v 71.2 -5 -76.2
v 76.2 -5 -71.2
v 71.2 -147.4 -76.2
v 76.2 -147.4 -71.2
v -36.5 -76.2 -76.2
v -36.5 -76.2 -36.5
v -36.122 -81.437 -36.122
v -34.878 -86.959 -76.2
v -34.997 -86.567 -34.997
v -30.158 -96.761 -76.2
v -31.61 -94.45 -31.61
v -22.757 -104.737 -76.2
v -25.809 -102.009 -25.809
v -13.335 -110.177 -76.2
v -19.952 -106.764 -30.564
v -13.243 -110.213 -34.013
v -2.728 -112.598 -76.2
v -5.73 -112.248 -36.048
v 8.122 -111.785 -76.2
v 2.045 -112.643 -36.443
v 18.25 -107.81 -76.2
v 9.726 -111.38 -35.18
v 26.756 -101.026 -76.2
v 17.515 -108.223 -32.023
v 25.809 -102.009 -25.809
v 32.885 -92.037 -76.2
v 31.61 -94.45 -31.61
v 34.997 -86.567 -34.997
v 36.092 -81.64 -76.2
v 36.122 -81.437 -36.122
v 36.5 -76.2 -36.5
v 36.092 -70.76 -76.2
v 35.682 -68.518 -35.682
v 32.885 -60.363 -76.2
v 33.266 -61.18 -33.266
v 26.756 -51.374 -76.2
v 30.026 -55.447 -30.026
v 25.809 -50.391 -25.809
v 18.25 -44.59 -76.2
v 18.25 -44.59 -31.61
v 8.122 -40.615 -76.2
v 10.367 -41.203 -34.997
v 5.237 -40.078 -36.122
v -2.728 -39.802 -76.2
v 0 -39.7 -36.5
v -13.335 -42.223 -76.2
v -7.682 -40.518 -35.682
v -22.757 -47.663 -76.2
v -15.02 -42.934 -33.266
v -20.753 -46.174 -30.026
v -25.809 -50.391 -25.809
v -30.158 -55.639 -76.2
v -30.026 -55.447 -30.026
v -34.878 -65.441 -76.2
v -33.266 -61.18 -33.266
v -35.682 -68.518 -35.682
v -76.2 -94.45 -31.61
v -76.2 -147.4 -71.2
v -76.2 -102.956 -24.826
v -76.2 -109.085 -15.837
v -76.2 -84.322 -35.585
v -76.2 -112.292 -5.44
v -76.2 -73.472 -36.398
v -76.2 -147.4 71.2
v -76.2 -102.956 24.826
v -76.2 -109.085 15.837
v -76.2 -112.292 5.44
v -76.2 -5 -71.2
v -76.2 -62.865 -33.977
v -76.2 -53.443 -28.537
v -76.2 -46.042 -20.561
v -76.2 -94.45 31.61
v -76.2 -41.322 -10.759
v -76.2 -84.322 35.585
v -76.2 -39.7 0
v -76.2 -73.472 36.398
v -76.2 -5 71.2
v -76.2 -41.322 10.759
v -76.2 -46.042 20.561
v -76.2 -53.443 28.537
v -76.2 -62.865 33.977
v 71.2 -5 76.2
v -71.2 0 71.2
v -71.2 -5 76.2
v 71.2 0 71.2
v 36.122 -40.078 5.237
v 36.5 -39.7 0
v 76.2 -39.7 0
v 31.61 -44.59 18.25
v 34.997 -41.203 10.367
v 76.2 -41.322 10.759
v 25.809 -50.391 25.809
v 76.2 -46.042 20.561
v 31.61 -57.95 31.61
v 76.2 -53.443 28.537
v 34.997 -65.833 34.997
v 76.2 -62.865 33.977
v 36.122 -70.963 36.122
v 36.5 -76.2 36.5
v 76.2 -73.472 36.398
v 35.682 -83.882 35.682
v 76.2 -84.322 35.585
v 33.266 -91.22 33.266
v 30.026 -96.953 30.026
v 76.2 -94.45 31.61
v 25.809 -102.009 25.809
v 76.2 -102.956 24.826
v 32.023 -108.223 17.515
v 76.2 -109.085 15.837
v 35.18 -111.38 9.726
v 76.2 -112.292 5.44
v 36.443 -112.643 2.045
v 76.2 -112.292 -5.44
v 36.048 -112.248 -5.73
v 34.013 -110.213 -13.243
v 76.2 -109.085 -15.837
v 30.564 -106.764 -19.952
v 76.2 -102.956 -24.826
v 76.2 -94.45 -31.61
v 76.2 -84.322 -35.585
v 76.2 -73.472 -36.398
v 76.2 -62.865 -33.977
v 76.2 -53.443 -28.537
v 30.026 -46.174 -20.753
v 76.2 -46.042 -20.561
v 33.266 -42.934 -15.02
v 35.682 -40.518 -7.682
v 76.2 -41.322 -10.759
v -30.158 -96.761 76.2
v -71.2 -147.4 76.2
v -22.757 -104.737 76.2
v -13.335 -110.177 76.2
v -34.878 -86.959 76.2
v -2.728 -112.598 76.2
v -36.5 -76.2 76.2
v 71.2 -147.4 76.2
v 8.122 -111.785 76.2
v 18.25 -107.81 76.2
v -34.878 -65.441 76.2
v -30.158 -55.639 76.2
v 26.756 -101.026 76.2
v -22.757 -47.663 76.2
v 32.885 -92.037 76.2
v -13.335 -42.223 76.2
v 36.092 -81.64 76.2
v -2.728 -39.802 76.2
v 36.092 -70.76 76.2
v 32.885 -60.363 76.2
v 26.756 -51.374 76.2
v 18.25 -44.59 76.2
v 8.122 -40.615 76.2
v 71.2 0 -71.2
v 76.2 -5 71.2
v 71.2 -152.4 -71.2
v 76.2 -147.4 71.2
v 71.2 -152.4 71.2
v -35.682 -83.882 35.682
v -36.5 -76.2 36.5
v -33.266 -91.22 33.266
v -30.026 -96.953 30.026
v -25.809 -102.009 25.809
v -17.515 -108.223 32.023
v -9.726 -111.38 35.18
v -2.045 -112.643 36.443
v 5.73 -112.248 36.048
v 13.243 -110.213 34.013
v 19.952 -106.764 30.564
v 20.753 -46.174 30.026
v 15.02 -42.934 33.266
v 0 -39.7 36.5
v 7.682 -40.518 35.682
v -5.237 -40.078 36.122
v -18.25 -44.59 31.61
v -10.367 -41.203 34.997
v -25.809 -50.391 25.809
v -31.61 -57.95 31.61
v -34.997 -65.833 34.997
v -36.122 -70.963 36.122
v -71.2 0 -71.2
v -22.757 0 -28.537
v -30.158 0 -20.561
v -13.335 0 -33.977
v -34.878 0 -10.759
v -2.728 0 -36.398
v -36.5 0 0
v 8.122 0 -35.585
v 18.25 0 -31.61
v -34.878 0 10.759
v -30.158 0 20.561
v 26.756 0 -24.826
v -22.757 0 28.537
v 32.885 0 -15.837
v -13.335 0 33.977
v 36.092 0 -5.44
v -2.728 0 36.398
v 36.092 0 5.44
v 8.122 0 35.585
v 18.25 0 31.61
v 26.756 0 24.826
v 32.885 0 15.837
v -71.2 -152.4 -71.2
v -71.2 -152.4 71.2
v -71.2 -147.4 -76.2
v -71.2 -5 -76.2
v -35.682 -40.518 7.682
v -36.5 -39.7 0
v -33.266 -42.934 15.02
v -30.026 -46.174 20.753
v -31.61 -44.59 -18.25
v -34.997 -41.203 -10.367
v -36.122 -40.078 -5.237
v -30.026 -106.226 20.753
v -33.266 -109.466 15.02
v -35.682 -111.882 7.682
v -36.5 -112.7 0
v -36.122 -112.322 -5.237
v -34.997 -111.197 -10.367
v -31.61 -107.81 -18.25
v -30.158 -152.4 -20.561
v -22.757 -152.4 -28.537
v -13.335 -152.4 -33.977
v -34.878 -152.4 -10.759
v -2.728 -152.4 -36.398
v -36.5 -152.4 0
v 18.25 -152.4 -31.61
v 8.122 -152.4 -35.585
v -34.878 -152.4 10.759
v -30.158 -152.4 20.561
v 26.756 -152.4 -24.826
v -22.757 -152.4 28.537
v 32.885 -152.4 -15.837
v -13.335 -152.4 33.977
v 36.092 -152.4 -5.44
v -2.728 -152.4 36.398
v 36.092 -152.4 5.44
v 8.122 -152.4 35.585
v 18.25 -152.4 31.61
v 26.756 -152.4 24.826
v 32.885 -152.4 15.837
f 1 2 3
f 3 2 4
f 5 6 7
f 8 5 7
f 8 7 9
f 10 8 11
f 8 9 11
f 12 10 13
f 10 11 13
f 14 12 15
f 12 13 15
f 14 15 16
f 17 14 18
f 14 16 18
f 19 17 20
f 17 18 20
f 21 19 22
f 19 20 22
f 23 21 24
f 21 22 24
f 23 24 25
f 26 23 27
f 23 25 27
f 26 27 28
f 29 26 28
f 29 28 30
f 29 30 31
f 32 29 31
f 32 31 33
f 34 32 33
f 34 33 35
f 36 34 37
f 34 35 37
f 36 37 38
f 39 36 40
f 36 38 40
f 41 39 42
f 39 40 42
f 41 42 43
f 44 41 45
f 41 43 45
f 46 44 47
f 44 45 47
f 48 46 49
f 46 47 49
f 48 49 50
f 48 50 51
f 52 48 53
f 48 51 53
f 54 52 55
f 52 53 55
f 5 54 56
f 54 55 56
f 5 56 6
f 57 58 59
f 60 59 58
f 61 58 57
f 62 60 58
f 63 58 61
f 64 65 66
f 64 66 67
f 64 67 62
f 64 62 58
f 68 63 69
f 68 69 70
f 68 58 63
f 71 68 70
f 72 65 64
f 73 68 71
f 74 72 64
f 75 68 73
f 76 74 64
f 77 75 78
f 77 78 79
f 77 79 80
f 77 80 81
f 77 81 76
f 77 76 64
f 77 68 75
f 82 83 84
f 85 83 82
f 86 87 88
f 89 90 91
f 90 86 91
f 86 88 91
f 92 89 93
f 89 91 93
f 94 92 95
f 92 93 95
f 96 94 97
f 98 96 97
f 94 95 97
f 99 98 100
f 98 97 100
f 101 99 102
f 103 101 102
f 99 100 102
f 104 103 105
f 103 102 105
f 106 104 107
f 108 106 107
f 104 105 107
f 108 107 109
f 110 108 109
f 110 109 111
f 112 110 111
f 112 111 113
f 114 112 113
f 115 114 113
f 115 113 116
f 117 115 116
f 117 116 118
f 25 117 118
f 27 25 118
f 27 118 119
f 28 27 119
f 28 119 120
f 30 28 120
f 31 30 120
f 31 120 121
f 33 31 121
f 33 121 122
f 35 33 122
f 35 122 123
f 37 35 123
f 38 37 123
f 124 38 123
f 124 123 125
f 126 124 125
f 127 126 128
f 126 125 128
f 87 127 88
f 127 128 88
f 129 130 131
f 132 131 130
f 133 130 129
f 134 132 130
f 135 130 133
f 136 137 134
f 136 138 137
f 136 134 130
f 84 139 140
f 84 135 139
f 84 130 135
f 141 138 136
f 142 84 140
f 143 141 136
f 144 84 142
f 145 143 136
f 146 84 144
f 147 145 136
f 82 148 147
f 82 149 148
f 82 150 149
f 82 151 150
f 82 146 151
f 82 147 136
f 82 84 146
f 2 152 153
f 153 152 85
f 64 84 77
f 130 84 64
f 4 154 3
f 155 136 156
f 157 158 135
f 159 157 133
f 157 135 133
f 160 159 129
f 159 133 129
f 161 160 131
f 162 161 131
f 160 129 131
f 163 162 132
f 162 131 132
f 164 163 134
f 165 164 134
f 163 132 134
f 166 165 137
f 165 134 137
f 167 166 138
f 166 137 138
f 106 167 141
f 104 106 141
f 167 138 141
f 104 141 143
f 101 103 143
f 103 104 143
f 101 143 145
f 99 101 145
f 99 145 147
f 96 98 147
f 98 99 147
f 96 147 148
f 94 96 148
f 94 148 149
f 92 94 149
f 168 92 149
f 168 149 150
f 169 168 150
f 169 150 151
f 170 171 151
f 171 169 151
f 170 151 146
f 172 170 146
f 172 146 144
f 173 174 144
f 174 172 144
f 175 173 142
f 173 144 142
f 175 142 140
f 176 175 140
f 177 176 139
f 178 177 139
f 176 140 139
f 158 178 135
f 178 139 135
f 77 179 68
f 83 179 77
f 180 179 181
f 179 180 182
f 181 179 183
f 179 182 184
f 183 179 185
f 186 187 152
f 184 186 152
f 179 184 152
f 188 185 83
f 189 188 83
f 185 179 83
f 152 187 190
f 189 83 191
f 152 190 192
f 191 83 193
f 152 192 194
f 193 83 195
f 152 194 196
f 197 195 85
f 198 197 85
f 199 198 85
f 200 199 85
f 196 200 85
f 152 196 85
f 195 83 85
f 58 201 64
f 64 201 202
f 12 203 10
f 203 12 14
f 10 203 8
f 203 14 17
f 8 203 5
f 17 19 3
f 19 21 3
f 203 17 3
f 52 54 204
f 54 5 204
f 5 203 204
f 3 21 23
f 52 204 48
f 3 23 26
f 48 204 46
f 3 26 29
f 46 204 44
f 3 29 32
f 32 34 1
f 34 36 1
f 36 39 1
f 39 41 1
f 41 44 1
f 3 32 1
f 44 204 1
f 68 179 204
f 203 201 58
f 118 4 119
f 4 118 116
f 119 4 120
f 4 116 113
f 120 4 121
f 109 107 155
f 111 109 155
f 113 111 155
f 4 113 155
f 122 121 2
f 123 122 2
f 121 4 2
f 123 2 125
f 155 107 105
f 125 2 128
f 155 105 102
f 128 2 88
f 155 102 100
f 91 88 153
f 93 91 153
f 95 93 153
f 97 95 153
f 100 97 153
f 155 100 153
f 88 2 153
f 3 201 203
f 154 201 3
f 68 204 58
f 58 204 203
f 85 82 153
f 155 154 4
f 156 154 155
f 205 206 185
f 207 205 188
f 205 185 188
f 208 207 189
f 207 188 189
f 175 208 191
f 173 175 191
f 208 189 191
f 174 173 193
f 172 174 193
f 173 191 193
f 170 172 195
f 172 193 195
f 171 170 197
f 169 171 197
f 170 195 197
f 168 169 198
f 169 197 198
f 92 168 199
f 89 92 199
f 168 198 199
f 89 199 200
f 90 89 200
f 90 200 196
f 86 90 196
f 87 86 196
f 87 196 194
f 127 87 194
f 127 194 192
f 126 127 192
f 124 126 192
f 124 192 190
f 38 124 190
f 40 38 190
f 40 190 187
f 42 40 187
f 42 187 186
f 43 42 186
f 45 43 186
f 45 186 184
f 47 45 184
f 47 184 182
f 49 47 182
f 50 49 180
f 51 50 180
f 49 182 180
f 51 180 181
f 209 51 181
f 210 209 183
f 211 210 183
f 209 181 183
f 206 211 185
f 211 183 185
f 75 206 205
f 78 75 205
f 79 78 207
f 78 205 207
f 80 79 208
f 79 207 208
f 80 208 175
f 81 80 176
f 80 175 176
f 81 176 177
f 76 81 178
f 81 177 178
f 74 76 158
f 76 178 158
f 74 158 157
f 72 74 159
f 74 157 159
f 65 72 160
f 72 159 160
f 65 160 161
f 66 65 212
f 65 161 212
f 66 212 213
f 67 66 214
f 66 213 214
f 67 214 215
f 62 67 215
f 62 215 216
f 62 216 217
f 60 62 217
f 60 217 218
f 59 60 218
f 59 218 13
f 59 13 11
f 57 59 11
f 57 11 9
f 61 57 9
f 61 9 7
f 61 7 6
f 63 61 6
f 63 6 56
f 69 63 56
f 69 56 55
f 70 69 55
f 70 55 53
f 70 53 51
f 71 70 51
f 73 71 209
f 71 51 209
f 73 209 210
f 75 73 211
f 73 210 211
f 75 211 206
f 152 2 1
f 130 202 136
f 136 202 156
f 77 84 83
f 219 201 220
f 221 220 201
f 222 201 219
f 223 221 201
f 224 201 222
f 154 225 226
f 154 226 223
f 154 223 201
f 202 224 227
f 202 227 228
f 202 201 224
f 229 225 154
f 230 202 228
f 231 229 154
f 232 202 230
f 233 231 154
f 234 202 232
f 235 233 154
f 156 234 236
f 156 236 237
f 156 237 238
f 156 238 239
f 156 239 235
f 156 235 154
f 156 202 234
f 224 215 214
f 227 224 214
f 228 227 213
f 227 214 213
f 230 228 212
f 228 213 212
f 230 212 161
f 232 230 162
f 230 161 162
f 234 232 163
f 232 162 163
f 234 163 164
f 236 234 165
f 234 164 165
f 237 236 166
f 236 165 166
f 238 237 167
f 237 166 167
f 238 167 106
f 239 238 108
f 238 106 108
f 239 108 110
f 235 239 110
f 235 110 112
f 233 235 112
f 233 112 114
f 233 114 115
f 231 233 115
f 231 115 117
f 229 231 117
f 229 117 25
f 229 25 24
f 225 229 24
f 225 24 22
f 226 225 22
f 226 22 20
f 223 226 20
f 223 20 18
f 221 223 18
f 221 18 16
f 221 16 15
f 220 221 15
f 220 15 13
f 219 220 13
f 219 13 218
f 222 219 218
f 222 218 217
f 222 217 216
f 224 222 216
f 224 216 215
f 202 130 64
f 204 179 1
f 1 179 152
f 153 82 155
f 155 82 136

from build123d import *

# Parameters (mm, degrees)
F0_W       = 152.4
F0_H       = 152.4
F1_DEPTH   = 152.4
F2_SIZE    = 5
F3_R       = 36.5
F4_DEPTH   = 152.401
F7_D       = 73
F7_ON_F5_D = 73


with BuildPart() as f1:
    # F0 (on Front) → F1 (new body)
    with BuildSketch(Plane.XZ):
        Rectangle(F0_W, F0_H)
    extrude(amount=F1_DEPTH)

    # F2
    f2_edges = [f1.edges().sort_by_distance(p)[0] for p in [
        (0, -152.4, 76.2),
        (-76.2, -76.2, 76.2),
        (76.2, -76.2, 76.2),
        (0, 0, 76.2),
        (76.2, -152.4, 0),
        (-76.2, -152.4, 0),
        (0, -152.4, -76.2),
        (76.2, -76.2, -76.2),
        (76.2, 0, 0),
        (-76.2, 0, 0),
        (0, 0, -76.2),
        (-76.2, -76.2, -76.2),
    ]]
    chamfer(f2_edges, length=F2_SIZE)

    # F3 (on face) → F4 (cut, through all)
    with BuildSketch(Plane(origin=(0, 0, 0), x_dir=(-1, 0, 0), z_dir=(0, 1, 0))):
        Circle(F3_R)
    extrude(amount=-F4_DEPTH, mode=Mode.SUBTRACT)

    # F7 (through all)
    with Locations(Plane(origin=(-76.2, 0, 0), x_dir=(0, -1, 0), z_dir=(-1, 0, 0))):
        with Locations((76.2, 0)):
            Hole(F7_D / 2)

    # F7 on F5 (through all)
    with Locations(Plane(origin=(0, 0, -76.2), x_dir=(1, 0, 0), z_dir=(0, 0, -1))):
        with Locations((0, 76.2)):
            Hole(F7_ON_F5_D / 2)


solid = f1.part
